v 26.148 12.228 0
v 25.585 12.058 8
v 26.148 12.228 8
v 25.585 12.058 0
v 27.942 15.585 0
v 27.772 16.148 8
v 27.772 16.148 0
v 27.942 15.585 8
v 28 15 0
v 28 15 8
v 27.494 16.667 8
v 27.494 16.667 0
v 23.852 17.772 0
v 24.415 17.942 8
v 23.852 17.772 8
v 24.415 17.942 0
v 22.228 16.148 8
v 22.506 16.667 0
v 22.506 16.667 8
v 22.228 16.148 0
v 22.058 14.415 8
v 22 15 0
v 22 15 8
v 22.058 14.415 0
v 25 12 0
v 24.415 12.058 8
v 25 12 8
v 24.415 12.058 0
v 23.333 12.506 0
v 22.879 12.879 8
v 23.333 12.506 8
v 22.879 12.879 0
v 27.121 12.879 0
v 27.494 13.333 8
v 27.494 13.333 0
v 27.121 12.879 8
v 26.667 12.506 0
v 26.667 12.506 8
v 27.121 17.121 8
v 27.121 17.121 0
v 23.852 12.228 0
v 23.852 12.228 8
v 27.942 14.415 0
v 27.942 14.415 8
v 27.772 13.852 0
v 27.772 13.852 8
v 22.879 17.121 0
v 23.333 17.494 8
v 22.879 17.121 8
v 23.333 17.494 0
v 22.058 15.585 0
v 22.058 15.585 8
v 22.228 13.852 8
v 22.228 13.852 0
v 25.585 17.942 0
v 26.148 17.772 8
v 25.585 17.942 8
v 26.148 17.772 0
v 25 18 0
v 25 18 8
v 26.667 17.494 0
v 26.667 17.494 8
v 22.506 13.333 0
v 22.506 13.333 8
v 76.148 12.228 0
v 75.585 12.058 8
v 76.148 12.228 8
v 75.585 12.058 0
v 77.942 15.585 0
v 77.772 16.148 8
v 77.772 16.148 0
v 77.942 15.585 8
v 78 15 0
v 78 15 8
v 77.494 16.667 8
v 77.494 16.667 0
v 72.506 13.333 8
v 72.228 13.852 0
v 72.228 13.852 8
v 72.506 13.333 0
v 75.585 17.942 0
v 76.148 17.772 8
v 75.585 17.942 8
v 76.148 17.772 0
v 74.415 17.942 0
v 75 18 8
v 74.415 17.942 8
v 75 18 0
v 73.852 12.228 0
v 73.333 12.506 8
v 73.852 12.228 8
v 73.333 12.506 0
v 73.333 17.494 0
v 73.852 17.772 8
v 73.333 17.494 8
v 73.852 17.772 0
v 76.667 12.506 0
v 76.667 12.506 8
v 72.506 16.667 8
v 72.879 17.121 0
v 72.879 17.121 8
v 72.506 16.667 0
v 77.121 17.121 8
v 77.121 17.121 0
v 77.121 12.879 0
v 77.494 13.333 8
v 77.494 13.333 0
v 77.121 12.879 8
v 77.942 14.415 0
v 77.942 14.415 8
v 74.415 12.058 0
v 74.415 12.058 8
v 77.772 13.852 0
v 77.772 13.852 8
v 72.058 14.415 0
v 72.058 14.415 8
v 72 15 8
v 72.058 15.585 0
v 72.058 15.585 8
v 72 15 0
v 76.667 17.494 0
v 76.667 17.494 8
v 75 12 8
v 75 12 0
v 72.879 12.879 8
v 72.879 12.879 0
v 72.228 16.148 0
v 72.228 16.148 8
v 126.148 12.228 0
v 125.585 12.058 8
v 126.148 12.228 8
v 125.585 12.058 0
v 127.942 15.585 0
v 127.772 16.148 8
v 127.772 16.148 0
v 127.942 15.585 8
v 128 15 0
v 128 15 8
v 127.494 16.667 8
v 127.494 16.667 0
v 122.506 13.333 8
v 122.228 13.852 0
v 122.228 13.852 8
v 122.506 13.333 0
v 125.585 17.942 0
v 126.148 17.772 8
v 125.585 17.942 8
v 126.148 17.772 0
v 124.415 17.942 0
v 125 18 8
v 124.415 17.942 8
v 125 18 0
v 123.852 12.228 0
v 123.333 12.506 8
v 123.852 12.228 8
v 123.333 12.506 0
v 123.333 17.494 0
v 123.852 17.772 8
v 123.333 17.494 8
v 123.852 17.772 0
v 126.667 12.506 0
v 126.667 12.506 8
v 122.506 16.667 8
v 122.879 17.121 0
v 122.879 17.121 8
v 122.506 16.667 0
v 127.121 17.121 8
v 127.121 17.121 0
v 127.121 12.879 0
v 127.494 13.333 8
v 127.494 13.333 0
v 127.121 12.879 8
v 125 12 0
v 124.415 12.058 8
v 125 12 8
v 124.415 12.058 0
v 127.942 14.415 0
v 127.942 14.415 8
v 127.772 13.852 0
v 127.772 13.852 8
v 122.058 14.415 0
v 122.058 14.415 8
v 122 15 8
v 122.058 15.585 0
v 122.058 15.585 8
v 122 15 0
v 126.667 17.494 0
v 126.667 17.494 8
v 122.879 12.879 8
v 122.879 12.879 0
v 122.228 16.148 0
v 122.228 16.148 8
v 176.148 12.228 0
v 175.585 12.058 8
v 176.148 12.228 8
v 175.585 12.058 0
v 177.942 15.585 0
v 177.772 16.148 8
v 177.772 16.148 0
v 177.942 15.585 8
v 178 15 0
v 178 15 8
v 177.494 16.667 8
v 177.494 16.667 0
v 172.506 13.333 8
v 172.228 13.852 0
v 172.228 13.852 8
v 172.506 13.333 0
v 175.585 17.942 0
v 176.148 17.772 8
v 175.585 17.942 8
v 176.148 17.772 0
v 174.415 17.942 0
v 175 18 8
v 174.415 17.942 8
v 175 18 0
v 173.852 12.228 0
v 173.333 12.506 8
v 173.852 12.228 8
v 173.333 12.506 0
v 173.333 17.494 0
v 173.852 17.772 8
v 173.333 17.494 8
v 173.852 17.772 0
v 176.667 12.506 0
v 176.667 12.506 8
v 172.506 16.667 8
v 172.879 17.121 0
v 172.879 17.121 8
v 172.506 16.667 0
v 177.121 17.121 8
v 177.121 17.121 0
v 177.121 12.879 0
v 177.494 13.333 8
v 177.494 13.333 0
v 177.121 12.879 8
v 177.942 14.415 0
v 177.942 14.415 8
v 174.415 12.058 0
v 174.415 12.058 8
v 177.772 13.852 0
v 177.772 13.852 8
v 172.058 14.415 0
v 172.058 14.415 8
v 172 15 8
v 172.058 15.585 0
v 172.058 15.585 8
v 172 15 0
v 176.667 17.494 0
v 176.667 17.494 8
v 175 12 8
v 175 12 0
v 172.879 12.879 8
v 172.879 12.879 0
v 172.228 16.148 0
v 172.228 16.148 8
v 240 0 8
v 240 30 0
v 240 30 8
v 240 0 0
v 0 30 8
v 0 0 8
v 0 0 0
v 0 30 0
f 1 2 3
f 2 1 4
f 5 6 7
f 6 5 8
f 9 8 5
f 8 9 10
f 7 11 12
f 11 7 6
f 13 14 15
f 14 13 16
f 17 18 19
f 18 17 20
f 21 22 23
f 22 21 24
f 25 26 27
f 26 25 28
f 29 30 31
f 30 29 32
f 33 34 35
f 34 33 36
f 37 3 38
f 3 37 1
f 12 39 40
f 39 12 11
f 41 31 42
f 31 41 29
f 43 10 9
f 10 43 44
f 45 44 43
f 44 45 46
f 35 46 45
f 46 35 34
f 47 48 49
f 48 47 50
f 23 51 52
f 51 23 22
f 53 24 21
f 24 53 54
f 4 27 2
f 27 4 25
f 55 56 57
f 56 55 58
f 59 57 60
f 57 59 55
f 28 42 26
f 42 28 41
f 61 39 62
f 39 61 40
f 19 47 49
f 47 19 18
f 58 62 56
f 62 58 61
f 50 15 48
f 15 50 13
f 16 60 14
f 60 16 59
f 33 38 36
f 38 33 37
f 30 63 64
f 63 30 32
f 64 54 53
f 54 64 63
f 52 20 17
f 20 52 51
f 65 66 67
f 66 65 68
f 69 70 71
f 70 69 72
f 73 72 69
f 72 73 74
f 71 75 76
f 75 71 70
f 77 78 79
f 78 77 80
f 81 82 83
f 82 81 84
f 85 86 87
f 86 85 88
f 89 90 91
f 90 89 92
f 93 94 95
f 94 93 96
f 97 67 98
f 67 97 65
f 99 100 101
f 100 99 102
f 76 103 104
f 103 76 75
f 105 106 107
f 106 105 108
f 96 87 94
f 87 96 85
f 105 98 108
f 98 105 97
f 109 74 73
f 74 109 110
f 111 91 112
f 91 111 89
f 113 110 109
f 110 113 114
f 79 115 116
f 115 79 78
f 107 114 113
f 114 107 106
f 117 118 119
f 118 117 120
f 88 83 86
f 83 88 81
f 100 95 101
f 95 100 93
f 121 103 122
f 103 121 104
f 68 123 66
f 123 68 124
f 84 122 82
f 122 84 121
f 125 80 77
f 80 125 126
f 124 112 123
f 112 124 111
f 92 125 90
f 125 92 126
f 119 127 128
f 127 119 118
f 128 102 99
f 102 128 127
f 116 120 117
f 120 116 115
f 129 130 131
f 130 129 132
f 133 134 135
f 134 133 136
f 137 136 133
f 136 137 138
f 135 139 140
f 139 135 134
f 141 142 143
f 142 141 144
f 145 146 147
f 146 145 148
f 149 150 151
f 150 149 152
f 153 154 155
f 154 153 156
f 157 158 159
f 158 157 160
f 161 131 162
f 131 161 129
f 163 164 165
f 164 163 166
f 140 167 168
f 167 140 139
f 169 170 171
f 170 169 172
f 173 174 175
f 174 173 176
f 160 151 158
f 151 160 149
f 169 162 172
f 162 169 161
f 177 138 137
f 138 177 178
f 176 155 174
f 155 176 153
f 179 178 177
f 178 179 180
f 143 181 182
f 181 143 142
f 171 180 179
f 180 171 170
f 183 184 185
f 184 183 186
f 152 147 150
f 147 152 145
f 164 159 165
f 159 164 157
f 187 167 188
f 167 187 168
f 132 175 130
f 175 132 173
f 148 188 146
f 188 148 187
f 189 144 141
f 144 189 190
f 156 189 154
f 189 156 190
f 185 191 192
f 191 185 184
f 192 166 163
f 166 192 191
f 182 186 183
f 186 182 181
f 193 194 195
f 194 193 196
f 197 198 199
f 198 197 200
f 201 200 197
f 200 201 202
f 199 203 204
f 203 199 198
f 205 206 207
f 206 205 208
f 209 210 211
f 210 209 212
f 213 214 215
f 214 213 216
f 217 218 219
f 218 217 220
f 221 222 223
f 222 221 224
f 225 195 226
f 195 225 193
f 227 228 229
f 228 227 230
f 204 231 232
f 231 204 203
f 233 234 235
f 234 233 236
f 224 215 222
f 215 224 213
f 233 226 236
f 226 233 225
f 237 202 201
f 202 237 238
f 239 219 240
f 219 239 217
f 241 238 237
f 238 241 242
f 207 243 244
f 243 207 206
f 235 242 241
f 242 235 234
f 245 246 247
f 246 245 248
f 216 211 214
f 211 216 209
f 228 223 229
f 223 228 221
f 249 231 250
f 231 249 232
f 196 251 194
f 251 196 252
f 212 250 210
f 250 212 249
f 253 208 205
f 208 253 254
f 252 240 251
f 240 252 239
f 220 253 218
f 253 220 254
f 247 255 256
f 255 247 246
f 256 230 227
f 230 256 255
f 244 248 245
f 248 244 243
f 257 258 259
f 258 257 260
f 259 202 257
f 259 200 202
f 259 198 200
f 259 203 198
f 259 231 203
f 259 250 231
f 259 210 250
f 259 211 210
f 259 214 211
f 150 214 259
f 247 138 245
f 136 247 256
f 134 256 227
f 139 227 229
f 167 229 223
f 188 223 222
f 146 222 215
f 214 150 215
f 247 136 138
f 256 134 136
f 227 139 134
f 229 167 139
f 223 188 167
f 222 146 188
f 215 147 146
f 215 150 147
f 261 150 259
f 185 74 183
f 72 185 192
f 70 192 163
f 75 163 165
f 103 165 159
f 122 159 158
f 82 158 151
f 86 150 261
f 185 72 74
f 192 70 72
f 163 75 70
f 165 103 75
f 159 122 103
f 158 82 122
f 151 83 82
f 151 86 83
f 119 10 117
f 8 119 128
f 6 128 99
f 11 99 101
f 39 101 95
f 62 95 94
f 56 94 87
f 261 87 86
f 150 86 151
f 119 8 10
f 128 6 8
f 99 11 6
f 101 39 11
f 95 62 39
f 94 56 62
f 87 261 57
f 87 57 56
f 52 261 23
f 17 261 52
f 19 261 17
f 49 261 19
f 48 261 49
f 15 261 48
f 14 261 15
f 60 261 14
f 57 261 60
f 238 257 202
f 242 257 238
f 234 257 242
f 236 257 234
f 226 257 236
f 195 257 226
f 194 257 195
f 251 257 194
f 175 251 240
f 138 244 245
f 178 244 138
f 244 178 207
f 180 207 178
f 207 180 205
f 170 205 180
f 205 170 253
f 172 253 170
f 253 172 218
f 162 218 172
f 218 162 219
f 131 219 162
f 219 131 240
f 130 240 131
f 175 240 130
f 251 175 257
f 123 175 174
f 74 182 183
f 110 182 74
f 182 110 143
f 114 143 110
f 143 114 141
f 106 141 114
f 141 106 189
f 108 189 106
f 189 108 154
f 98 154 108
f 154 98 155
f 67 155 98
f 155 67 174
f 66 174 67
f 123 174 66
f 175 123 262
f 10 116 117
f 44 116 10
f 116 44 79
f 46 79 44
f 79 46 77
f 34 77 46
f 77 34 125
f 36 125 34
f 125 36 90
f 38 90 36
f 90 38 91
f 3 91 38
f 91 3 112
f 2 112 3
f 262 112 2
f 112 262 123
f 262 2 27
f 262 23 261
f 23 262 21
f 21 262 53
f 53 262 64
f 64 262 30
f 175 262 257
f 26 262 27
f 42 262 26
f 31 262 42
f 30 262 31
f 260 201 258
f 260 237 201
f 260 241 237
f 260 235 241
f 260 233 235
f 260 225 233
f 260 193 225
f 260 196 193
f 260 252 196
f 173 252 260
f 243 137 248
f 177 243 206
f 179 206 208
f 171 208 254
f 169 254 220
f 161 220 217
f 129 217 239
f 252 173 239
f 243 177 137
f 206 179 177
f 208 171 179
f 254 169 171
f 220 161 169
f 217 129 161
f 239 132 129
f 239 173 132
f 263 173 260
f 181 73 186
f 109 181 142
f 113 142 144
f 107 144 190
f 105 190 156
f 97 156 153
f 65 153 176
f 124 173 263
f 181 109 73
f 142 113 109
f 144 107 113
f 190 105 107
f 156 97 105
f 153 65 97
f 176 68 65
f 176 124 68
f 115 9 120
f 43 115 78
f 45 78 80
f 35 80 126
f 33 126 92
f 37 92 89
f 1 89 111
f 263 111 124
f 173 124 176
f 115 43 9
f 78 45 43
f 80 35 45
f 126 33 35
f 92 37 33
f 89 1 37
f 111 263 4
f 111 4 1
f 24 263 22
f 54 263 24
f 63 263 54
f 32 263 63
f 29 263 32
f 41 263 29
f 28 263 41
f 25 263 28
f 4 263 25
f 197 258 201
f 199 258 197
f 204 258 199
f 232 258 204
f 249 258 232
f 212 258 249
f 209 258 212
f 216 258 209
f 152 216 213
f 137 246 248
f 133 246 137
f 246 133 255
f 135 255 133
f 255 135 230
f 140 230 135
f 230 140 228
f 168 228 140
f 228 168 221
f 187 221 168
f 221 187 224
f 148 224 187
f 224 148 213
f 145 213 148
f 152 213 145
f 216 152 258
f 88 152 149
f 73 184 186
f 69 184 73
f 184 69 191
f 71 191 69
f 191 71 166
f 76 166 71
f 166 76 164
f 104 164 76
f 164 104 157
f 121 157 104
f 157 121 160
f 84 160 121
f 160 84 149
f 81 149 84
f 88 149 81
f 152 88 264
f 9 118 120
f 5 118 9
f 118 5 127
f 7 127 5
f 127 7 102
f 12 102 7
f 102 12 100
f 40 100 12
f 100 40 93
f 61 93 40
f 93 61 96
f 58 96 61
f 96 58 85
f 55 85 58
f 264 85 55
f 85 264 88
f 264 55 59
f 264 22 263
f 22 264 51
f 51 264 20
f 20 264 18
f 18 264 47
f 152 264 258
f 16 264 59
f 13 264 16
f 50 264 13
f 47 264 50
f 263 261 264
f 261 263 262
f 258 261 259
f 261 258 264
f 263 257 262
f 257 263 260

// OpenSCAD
$fn = 32;

// ----------------------------------------------------------------------
// Long rail: 200-250 mm mounting rail
// ----------------------------------------------------------------------

// --- parameters (mm) ---
rail_l = 240;             // rail length, X
rail_w = 30;              // rail width, Y
rail_t = 8;               // rail thickness, Z
hole_d = 6;               // mounting hole diameter
hole_start = 25;          // first hole offset from the end
hole_pitch = 50;          // hole pitch
holes = 4;                // number of holes
fit_tol = 0.05;           // tolerance for press fits, mm
free_tol = 0.2;           // tolerance for clearance fits, mm

difference() {
  cube([rail_l, rail_w, rail_t]);
  for (i = [0 : holes - 1])
    translate([hole_start + i * hole_pitch, rail_w / 2, -1])
      cylinder(h = rail_t + 2, d = hole_d);
}
